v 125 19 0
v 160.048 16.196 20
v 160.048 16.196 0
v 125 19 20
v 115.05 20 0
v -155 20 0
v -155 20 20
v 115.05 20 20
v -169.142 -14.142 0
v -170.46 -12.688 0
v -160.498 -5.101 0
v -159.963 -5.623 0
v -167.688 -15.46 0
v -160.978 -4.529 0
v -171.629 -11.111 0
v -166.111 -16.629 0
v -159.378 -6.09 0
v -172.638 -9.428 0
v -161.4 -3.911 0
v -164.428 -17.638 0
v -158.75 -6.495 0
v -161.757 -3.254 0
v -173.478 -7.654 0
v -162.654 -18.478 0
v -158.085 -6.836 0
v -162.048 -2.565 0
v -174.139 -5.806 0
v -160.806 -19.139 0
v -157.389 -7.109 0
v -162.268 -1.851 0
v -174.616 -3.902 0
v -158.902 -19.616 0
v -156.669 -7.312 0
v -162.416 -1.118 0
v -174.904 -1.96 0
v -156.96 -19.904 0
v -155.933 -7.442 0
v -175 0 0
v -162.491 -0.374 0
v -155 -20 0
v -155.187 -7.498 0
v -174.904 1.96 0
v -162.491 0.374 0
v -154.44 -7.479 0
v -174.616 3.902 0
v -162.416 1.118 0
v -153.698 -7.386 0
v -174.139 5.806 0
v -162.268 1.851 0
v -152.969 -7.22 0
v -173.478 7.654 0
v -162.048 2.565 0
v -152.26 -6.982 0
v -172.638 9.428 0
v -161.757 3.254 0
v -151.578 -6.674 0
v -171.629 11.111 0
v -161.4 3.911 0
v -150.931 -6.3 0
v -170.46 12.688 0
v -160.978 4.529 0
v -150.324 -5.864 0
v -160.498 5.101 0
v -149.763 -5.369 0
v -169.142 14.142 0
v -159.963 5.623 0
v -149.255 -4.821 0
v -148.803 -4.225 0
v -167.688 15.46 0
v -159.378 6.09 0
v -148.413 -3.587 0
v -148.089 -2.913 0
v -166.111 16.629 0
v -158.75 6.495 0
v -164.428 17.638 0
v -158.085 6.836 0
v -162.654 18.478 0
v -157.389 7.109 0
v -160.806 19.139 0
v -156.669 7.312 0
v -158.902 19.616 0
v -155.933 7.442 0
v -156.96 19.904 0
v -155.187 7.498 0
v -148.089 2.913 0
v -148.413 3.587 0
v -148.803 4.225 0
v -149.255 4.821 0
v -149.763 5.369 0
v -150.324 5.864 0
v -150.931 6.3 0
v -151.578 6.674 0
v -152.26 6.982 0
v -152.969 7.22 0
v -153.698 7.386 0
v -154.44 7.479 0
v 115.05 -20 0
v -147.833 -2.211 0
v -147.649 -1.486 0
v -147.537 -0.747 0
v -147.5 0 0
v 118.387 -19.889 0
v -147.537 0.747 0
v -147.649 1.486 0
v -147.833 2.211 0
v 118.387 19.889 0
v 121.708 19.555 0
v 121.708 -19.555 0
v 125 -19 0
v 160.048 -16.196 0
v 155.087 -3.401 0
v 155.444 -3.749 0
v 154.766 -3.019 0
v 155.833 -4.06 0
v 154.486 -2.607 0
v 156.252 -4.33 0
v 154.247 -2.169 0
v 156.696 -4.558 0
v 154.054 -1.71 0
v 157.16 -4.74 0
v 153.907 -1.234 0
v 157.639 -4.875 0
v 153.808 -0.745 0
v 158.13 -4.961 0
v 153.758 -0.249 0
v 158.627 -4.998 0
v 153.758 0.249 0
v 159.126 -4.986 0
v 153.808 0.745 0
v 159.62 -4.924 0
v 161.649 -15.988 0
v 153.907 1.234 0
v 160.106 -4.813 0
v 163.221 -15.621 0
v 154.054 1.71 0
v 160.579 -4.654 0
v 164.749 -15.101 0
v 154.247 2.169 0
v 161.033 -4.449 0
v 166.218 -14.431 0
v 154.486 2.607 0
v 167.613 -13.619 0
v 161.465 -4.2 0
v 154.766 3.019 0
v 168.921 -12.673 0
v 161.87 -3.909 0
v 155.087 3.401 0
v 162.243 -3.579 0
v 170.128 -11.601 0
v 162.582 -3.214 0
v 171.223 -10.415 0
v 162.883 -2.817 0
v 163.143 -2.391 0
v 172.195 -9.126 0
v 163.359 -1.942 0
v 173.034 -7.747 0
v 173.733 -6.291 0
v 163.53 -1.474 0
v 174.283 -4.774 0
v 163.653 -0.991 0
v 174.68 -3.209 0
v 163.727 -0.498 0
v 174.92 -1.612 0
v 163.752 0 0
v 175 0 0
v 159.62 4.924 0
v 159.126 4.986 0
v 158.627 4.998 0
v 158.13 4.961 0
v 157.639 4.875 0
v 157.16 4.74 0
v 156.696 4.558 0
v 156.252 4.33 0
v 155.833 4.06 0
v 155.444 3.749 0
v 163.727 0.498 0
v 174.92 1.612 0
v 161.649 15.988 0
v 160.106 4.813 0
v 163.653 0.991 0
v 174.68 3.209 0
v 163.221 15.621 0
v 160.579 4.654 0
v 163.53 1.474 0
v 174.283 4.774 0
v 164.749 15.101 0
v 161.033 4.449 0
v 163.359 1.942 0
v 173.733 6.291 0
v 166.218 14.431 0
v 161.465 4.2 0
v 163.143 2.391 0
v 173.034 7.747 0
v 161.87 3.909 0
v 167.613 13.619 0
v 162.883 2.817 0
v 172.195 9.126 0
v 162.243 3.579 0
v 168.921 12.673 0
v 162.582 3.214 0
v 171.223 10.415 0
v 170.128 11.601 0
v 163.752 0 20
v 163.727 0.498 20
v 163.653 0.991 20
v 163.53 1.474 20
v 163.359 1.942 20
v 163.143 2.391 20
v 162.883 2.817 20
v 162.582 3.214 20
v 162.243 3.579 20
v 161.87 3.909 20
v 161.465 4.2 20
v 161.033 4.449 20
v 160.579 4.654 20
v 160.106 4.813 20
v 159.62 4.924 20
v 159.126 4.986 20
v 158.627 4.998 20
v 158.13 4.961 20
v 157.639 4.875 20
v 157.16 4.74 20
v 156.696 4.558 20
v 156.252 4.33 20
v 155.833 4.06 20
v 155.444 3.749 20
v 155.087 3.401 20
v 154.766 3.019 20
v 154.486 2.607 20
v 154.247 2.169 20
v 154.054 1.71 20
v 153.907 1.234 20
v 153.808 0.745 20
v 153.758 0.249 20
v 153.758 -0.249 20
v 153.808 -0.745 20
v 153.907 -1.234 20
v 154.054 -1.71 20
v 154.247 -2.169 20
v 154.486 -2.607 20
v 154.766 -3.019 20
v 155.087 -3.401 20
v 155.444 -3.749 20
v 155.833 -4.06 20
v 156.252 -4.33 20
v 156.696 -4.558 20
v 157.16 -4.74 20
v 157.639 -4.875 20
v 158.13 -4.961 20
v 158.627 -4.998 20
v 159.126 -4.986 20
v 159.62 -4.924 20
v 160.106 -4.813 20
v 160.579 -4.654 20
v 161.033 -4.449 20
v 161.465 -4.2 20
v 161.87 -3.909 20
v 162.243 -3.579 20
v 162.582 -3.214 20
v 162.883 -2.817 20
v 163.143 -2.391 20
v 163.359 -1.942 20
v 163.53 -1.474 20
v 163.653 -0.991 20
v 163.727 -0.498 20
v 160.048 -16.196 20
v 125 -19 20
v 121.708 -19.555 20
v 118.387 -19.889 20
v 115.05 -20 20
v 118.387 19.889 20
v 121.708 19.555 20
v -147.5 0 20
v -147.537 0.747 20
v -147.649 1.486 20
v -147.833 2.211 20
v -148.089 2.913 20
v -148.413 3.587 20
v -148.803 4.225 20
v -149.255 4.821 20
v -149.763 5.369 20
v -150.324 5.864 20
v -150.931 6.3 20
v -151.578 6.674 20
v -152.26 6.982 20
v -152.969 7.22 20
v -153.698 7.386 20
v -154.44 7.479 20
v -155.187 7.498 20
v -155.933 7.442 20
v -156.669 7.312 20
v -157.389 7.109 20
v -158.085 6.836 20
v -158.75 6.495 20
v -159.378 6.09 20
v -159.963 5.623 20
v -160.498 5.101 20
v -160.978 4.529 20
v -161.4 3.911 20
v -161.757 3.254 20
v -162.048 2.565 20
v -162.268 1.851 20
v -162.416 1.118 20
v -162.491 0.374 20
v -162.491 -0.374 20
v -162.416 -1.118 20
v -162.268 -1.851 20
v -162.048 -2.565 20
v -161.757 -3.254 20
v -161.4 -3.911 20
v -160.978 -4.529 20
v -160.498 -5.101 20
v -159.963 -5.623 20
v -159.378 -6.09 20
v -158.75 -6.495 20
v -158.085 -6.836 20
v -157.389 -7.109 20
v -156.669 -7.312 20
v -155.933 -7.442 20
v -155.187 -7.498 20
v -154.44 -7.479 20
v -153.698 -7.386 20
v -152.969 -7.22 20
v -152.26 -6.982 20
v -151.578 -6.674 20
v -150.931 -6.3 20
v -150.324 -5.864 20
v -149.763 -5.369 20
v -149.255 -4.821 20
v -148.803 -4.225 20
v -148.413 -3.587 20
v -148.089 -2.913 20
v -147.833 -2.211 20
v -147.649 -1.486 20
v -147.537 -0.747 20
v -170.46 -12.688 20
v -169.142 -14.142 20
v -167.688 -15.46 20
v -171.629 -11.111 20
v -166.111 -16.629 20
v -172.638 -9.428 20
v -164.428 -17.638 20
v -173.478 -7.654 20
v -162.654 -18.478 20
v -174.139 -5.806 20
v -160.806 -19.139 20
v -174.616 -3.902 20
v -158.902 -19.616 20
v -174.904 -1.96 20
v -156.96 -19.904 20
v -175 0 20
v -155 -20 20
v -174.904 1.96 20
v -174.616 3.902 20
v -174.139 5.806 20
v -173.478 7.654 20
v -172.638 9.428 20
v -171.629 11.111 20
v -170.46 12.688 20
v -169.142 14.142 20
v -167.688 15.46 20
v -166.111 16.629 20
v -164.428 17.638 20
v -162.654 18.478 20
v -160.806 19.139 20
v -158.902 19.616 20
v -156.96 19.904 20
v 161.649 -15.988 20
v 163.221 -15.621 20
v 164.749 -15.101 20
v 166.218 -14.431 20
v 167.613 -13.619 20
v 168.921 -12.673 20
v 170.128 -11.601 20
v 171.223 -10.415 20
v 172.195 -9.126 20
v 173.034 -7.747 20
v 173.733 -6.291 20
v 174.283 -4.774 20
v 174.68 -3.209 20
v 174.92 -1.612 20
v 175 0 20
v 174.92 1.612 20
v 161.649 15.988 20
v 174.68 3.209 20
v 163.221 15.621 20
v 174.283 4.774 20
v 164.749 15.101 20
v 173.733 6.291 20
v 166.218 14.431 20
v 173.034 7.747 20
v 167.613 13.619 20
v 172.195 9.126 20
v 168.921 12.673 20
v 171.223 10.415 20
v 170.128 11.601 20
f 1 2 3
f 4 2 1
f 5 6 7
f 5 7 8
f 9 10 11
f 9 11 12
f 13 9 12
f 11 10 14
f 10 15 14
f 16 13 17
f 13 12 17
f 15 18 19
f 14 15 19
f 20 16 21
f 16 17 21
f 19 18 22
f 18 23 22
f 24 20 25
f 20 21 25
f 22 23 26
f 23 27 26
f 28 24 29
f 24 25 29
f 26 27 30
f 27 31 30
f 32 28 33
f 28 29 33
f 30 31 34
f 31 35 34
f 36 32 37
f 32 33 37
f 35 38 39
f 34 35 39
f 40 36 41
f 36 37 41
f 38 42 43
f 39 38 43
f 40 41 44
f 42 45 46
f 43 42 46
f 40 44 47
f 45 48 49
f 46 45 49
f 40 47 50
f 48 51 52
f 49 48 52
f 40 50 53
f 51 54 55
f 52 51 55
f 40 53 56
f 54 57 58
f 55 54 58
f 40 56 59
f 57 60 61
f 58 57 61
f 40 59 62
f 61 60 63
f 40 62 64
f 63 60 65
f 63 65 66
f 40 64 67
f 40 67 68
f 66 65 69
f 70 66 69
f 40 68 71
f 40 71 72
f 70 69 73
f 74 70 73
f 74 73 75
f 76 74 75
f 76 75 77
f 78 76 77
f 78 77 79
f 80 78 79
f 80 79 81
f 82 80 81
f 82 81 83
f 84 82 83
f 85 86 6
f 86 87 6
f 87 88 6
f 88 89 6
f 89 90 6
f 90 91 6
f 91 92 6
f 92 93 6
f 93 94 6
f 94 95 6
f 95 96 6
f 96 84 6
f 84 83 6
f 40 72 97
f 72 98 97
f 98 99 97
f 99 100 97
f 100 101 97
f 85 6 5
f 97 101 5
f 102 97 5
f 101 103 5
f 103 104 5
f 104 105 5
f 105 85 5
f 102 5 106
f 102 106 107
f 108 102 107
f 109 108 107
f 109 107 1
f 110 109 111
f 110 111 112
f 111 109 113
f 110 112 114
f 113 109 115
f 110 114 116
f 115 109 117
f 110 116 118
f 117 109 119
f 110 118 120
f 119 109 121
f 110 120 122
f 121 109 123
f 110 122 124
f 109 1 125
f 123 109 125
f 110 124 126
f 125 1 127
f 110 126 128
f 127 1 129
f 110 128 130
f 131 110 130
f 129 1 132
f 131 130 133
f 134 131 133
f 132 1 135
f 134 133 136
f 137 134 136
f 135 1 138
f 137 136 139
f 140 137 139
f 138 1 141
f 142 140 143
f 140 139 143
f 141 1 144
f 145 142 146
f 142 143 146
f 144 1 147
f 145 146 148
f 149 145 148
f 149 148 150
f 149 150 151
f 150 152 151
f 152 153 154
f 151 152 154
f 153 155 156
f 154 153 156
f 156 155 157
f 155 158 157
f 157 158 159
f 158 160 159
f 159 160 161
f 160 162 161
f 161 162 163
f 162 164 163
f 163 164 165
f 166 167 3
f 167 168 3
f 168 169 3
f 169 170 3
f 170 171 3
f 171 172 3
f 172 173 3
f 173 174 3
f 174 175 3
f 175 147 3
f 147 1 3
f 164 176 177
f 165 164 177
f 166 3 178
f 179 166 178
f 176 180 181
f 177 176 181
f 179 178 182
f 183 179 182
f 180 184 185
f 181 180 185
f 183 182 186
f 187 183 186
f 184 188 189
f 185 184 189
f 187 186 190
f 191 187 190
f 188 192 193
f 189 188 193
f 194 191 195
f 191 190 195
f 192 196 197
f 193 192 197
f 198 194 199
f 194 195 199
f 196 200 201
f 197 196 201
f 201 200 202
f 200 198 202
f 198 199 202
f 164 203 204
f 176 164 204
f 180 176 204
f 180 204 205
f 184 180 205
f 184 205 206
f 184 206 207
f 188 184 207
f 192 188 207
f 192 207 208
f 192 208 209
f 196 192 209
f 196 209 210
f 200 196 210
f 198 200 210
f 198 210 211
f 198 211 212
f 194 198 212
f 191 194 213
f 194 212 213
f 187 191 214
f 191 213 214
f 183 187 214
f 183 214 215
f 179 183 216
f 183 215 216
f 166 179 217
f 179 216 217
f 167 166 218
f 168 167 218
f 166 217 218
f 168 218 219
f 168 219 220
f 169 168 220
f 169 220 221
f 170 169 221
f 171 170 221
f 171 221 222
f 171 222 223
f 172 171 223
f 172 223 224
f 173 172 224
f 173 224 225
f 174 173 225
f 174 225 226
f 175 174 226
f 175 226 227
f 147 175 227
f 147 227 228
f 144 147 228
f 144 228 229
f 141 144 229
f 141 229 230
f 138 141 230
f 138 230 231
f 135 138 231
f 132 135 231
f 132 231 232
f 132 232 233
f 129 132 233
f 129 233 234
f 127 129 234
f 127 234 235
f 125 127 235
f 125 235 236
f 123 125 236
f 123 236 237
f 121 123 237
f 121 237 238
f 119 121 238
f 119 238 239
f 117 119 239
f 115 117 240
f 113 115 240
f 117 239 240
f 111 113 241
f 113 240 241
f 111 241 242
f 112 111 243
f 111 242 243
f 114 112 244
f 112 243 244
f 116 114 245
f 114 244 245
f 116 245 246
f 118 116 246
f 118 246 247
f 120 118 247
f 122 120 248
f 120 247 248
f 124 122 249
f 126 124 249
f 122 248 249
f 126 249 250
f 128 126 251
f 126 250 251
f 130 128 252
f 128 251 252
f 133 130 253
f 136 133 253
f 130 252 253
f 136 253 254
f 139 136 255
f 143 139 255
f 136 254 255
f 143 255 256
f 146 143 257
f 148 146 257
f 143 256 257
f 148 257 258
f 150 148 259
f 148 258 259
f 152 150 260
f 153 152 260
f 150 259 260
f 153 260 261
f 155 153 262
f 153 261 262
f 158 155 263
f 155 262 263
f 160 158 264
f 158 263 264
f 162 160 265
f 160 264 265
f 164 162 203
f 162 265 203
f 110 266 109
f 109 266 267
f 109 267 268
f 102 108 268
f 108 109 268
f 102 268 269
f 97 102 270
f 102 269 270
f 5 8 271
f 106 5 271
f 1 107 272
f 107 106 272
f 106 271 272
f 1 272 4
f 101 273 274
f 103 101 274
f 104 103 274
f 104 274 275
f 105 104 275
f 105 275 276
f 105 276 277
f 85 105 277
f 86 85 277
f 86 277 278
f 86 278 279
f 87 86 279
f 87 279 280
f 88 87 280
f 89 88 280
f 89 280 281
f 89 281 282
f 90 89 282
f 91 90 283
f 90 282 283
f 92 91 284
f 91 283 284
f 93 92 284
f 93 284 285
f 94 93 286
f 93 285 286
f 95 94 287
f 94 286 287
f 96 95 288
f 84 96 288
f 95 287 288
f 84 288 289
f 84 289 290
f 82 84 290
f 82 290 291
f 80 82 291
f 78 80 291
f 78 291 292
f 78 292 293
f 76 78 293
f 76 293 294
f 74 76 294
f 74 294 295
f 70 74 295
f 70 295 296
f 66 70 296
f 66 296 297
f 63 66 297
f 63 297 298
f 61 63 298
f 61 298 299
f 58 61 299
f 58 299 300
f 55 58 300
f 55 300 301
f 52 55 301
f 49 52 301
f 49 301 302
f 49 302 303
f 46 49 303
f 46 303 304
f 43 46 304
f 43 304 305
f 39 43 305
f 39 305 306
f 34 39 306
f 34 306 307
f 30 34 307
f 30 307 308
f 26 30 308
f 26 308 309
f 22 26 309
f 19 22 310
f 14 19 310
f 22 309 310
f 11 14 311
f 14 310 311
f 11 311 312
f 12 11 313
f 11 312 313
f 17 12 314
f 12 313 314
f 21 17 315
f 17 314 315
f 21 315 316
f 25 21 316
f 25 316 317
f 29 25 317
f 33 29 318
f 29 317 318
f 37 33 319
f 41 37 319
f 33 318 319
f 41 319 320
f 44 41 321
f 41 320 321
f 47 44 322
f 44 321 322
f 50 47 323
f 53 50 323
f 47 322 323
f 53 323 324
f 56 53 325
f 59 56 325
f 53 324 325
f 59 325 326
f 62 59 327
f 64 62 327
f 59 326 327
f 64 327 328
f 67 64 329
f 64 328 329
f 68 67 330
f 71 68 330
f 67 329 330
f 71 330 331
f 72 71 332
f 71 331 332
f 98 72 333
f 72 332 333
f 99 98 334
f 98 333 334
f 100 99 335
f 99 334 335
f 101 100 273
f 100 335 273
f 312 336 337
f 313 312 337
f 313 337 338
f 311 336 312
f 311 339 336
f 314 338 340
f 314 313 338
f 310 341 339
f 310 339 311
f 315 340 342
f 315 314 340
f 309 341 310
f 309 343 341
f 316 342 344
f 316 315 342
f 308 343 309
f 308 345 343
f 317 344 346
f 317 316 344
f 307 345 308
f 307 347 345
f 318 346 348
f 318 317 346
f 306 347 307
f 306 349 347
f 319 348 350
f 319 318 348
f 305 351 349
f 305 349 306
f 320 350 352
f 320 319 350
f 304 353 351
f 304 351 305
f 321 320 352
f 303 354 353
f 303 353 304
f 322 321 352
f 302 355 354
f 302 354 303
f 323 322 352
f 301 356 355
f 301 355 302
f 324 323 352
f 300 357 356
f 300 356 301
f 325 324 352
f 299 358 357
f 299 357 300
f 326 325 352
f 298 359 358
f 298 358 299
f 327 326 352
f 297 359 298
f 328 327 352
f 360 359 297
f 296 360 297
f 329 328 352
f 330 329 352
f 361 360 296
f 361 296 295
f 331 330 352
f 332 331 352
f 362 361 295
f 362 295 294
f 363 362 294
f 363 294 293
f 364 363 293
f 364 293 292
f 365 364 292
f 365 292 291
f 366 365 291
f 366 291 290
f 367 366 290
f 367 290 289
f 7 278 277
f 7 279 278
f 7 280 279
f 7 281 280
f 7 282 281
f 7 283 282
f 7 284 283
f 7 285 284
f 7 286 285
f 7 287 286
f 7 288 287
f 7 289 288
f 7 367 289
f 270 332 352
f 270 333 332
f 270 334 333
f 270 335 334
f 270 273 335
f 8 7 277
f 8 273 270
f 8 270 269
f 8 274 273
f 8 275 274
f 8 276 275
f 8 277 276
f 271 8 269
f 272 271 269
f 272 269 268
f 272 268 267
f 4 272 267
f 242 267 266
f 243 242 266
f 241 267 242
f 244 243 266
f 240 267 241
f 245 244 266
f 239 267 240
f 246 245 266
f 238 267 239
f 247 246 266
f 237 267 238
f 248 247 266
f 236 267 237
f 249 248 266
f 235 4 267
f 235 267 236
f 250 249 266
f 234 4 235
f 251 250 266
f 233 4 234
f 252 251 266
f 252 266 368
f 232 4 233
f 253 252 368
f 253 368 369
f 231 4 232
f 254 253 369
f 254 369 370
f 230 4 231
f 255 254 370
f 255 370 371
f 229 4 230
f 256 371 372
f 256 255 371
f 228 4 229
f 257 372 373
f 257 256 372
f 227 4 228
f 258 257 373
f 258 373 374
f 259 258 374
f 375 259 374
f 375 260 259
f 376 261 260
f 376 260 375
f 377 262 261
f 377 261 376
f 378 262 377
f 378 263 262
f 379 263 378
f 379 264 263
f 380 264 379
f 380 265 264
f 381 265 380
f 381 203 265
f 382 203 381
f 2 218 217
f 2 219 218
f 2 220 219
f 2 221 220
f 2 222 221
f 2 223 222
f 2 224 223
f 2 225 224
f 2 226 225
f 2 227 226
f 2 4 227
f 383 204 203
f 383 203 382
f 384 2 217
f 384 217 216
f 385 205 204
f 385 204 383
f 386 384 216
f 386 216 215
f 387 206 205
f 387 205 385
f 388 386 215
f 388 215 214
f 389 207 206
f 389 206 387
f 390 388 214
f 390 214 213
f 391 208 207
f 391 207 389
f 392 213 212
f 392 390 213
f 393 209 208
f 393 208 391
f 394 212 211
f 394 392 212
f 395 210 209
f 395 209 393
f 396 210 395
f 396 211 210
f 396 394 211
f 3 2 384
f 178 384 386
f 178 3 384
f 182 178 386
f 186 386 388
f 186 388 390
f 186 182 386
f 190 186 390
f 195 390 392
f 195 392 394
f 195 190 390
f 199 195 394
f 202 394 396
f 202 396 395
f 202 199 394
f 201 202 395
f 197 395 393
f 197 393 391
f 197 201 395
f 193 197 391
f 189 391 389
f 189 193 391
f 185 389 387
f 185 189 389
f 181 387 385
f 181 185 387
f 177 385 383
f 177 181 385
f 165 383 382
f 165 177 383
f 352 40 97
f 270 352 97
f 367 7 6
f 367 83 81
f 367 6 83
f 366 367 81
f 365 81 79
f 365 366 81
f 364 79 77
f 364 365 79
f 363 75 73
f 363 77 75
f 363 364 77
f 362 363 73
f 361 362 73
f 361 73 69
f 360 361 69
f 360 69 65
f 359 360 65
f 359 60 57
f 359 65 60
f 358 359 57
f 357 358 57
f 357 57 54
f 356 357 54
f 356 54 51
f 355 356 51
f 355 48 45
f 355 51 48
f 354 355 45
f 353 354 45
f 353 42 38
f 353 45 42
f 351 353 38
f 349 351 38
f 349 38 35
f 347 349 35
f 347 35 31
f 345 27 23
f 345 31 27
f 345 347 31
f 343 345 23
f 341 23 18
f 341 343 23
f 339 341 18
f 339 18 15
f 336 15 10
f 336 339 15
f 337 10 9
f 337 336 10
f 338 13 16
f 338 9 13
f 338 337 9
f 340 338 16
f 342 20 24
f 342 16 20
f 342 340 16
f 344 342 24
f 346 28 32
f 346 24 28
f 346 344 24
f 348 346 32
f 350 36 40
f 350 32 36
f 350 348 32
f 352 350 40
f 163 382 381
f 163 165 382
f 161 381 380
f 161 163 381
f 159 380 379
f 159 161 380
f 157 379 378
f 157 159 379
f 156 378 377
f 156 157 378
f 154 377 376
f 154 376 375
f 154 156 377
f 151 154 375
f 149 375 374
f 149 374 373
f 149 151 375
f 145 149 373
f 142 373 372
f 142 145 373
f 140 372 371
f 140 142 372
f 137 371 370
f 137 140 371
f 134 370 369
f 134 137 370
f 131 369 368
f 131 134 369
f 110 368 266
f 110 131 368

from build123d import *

# Parameters (mm, degrees)
SKETCH1_W           = 350
SKETCH1_H           = 40
BOSS_EXTRUDE1_DEPTH = 20
CUT_EXTRUDE1_DEPTH  = 178.270979012
FILLET1_R           = 50
FILLET2_R           = 50
FILLET3_R           = 16.247923
FILLET4_RADIUS      = 20
FILLET4_LENGTH      = 20
SKETCH3_R           = 7.5
SKETCH3_R_2         = 5
CUT_EXTRUDE2_DEPTH  = 178.270979012


with BuildPart() as part:
    # Sketch1 → Boss-Extrude1 (new body)
    with BuildSketch(Plane.XY):
        Rectangle(SKETCH1_W, SKETCH1_H)
    extrude(amount=BOSS_EXTRUDE1_DEPTH)

    # Sketch2 → Cut-Extrude1 (cut, through all)
    with BuildSketch(Plane.XY.offset(20)):
        Polygon((175, 20), (175, 15), (125, 19), (125, 20), align=None)
    cut_extrude1 = extrude(amount=-CUT_EXTRUDE1_DEPTH, mode=Mode.SUBTRACT)

    # Fillet1
    # the kernel refuses this fillet: 50 mm, written as the material it takes off along each edge
    with BuildSketch(Plane(origin=(125, 20, 44.874685928), x_dir=(-1, 0, 0), z_dir=(0, 0, -1))) as fillet1_piece_1:
        with BuildLine():
            CenterArc((9.949874371, -50), FILLET1_R, 90, 11.478340955)
            Line((0, -1), (-0.198997487, -0.02))
            ThreePointArc((-0.198997487, -0.02), (-1, -0.5), (-1, 0))
            Line((-1, 0), (0, 1))
            Line((0, 1), (9.949874371, 1))
            Line((9.949874371, 1), (9.949874371, 0))
        make_face()
    extrude(amount=69.749371855, mode=Mode.SUBTRACT)

    # Mirror3: Cut-Extrude1 across plane
    add(cut_extrude1.mirror(Plane.ZX), mode=Mode.SUBTRACT)

    # Fillet2
    # the kernel refuses this fillet: 50 mm, written as the material it takes off along each edge
    with BuildSketch(Plane(origin=(125, -20, 44.874685928), x_dir=(0, 1, 0), z_dir=(0, 0, -1))) as fillet2_piece_1:
        with BuildLine():
            CenterArc((50, -9.949874371), FILLET2_R, 168.521659045, 11.478340955)
            Line((0, -9.949874371), (-1, -9.949874371))
            Line((-1, -9.949874371), (-1, 0))
            Line((-1, 0), (0, 1))
            ThreePointArc((0, 1), (0.5, 1), (0.02, 0.198997487))
            Line((0.02, 0.198997487), (1, 0))
        make_face()
    extrude(amount=69.749371855, mode=Mode.SUBTRACT)

    # Fillet3
    fillet3_edges = [part.edges().sort_by_distance(p)[0] for p in [
        (175, 15, 10),
        (175, -15, 10),
    ]]
    fillet(fillet3_edges, radius=FILLET3_R)

    # Fillet4: full round fillet: the end face becomes a half cylinder, R = half its width
    fillet4_face = Plane((-175, 0, 10), x_dir=(0, 0, 1), z_dir=(-1, 0, 0))  # on the end face: x along it, z out of the body
    fillet4_slab = fillet4_face.offset(-FILLET4_RADIUS / 2) * Box(FILLET4_LENGTH, 2 * FILLET4_RADIUS, FILLET4_RADIUS, mode=Mode.PRIVATE)  # the body's end, R deep
    fillet4_round = Plane((-155, 0, 10), x_dir=(-1, 0, 0), z_dir=(0, 0, 1)) * Cylinder(FILLET4_RADIUS, FILLET4_LENGTH, mode=Mode.PRIVATE)  # its axis R under the face
    add(fillet4_slab - fillet4_round, mode=Mode.SUBTRACT)

    # Sketch3 → Cut-Extrude2 (cut, through all)
    with BuildSketch(Plane.XY.offset(20)):
        with Locations((-155, 0)):
            Circle(SKETCH3_R)
        with Locations((158.752076555, 0)):
            Circle(SKETCH3_R_2)
    extrude(amount=-CUT_EXTRUDE2_DEPTH, mode=Mode.SUBTRACT)


solid = part.part
